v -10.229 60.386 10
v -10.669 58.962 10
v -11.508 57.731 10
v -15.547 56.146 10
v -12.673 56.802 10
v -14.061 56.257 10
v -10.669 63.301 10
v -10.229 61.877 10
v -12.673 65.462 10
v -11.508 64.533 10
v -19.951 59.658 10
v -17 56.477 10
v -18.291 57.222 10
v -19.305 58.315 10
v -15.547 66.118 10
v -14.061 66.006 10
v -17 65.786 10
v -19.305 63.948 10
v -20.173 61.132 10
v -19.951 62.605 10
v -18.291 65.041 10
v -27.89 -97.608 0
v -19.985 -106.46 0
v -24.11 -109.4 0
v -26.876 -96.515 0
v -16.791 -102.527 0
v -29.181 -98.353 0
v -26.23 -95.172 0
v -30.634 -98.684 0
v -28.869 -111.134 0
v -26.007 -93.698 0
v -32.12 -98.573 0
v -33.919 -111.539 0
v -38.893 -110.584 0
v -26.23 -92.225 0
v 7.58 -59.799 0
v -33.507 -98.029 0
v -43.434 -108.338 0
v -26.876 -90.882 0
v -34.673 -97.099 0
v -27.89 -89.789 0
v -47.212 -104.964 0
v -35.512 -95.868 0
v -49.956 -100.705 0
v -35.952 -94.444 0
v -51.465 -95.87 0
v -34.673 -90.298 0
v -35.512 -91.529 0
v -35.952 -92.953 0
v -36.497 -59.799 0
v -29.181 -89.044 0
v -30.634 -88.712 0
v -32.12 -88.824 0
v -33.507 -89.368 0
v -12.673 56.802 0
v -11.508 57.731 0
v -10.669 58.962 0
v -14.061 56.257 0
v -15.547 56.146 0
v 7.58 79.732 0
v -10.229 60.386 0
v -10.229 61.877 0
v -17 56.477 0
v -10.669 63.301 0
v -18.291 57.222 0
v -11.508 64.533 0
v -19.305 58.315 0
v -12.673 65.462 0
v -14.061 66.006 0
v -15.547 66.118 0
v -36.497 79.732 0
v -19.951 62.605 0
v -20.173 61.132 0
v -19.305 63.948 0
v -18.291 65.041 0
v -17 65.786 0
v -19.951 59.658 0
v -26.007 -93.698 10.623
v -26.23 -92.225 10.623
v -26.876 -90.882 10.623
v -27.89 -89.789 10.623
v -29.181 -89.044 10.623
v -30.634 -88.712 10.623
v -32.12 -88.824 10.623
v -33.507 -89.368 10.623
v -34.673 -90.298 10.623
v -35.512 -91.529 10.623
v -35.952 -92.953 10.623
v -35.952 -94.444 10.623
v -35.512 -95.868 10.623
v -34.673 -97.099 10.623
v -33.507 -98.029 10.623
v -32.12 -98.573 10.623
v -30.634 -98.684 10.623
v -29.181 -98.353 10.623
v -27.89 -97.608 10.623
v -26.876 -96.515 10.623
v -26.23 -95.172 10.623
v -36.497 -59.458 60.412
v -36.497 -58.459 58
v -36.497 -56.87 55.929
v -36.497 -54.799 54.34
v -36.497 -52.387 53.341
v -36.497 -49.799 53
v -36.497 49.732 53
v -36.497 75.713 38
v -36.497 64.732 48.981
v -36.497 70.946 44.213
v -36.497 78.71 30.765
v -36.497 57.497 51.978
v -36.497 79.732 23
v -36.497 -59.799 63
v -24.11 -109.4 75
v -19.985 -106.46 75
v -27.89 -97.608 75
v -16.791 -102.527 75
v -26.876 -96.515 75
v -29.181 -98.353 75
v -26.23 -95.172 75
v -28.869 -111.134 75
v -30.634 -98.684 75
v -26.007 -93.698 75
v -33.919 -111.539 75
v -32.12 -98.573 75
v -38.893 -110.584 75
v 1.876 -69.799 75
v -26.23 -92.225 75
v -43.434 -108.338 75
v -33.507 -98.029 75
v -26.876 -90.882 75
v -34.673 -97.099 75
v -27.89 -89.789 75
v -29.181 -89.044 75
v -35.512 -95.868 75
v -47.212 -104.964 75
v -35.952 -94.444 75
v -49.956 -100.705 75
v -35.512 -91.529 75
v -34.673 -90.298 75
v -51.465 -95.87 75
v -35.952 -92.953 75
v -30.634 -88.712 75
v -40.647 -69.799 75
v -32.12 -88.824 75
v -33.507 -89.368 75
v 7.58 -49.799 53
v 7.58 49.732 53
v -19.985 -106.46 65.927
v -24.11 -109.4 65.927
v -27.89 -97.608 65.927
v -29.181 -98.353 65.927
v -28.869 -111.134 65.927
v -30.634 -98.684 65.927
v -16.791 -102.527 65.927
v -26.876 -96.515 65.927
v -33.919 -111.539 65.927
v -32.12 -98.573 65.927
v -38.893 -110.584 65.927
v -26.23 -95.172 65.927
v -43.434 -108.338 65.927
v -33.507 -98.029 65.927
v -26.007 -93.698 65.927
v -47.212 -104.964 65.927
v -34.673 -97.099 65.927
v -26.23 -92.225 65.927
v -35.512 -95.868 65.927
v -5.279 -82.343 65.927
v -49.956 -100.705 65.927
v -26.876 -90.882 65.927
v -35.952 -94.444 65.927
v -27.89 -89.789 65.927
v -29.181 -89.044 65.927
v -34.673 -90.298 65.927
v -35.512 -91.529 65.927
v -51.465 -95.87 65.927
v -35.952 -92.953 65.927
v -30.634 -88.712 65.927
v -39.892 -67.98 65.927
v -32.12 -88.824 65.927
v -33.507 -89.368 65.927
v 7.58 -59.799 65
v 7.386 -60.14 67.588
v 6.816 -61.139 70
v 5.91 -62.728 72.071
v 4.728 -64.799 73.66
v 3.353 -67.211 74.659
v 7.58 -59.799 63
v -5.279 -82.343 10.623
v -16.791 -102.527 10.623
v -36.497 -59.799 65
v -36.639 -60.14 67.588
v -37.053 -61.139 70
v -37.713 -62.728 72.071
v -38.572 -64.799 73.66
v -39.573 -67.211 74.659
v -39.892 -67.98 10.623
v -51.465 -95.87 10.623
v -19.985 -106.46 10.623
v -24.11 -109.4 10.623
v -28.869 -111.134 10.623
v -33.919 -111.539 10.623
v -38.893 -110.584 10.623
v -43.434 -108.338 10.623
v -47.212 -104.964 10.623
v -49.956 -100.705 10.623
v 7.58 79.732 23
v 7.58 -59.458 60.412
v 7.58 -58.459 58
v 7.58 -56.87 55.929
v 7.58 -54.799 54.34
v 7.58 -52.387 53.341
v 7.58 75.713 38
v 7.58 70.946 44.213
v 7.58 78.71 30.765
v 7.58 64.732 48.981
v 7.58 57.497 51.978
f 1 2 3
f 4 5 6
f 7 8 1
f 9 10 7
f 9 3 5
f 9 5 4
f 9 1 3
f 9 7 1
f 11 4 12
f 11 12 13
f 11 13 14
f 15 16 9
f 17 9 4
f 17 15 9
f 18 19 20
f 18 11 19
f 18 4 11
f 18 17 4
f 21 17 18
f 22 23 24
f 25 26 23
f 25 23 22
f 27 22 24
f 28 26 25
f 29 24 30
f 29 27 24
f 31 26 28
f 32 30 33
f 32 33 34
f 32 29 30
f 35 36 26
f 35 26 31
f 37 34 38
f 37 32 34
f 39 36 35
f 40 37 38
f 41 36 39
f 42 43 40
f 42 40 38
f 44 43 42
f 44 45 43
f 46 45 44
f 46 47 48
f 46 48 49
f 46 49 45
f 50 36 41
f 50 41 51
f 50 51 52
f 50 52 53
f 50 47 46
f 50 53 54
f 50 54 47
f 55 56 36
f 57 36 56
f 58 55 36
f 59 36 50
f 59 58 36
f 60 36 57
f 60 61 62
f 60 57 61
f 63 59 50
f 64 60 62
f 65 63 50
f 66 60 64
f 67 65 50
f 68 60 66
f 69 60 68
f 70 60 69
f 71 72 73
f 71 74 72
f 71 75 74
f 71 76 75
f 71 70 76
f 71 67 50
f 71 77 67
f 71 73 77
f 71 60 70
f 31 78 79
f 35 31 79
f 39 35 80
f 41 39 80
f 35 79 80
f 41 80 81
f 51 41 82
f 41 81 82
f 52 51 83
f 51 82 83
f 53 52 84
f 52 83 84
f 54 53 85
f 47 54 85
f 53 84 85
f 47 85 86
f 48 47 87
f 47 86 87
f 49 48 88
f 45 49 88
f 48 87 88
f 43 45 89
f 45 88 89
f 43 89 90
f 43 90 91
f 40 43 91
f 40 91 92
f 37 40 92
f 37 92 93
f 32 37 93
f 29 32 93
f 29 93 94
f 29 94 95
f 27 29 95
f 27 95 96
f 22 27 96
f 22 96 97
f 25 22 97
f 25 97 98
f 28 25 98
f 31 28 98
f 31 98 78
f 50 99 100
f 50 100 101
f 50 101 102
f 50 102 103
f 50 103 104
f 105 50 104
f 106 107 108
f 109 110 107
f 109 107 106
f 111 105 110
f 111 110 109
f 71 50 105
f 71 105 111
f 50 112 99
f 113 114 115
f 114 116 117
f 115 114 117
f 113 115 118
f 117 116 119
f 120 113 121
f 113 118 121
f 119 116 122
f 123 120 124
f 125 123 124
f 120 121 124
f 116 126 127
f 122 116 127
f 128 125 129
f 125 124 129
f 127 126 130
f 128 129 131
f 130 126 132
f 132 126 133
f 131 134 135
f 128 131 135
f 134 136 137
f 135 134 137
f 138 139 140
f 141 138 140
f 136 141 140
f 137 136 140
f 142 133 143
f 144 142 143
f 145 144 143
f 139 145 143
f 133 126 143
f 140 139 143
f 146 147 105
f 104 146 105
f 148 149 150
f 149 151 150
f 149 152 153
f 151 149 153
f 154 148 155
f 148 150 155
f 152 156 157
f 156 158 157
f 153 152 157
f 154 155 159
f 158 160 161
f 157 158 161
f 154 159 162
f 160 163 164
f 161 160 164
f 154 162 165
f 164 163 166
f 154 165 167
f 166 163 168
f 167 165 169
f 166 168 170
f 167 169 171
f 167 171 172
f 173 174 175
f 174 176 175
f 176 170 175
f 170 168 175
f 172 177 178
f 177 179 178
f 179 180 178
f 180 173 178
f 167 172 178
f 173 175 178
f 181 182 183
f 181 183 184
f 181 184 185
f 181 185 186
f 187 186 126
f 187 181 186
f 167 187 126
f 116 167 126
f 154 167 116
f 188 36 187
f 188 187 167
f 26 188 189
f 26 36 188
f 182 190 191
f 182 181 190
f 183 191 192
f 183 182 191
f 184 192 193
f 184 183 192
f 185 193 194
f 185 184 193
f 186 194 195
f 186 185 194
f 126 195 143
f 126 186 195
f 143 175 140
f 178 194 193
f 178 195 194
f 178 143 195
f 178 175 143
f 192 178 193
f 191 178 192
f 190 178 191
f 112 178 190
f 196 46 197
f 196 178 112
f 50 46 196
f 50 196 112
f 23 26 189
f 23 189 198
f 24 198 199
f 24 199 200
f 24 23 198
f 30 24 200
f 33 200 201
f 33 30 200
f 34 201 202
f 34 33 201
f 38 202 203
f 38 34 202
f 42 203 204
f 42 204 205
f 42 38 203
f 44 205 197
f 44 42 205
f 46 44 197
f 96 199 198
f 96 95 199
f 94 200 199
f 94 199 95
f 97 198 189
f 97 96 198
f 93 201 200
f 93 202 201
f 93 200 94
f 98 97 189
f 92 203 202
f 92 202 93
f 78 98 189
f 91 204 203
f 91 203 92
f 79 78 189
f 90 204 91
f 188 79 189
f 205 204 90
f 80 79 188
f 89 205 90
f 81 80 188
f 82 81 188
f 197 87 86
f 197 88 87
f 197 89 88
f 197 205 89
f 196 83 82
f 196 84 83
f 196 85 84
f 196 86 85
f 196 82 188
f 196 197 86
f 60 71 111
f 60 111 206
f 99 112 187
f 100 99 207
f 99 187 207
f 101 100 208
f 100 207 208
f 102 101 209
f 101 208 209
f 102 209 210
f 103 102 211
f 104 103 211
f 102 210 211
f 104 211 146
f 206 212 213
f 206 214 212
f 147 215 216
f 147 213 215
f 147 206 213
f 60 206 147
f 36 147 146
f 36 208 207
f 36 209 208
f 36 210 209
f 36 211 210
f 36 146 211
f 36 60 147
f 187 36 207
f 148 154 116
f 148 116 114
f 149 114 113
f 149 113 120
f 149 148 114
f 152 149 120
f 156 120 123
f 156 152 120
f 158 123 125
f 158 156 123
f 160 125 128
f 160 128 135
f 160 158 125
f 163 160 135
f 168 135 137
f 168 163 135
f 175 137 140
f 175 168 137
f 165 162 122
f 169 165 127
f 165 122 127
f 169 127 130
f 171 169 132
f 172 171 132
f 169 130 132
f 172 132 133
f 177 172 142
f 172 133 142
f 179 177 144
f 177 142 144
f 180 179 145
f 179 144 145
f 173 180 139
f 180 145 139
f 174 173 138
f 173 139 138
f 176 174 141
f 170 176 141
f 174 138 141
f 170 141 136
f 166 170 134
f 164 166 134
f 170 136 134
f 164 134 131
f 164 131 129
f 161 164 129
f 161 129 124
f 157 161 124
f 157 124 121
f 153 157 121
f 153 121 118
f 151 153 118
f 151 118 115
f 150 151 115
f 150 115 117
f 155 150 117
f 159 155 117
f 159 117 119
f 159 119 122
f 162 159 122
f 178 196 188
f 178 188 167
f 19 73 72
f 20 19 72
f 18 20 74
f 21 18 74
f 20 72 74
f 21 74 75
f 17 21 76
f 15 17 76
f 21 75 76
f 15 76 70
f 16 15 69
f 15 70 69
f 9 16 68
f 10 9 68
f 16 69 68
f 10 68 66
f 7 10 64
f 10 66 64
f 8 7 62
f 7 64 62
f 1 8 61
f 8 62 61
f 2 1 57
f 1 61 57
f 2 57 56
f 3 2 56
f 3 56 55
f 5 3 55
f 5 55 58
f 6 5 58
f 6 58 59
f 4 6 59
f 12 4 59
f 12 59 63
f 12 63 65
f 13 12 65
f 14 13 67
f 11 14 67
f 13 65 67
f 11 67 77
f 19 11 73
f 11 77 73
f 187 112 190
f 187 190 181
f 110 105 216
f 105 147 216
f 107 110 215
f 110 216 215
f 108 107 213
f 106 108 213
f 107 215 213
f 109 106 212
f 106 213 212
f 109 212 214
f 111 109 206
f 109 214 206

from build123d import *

# Parameters (mm, degrees)
EXTRUDE_1_DEPTH     = 53
EXTRUDE_2_DEPTH     = 22
FILLET_2_R          = 10
FILLET_3_R          = 10
SKETCH_3_W          = 55.304366744
SKETCH_3_H          = 61.895042574
CUT_EXTRUDE_1_DEPTH = 56
SKETCH_4_R          = 5
CUT_EXTRUDE_2_DEPTH = 75
SKETCH_5_R          = 5
CUT_EXTRUDE_3_DEPTH = 10
FILLET_4_R          = 30


with BuildPart() as part:
    # Эскиз1 → Бобышка-Вытянуть1 (new body)
    with BuildSketch(Plane.XY):
        with BuildLine():
            Line((7.580184654, -59.799234496), (-16.79145183, -102.52734615))
            ThreePointArc((-16.79145183, -102.52734615), (-36.438294134, -111.229048288), (-51.465460174, -95.869936548))
            Line((-51.465460174, -95.869936548), (-36.497185373, -59.799234496))
            Line((-36.497185373, -59.799234496), (-36.497185373, 79.732312661))
            Line((-36.497185373, 79.732312661), (7.580184654, 79.732312661))
            Line((7.580184654, 79.732312661), (7.580184654, -59.799234496))
        make_face()
    extrude(amount=EXTRUDE_1_DEPTH)

    # Эскиз2 → Бобышка-Вытянуть2 (add)
    with BuildSketch(Plane.XY.offset(53)):
        with BuildLine():
            Line((-36.497185373, -59.799234496), (7.580184654, -59.799234496))
            Line((7.580184654, -59.799234496), (-16.79145183, -102.52734615))
            ThreePointArc((-16.79145183, -102.52734615), (-36.438294134, -111.229048288), (-51.465460174, -95.869936548))
            Line((-51.465460174, -95.869936548), (-36.497185373, -59.799234496))
        make_face()
    extrude(amount=EXTRUDE_2_DEPTH)

    # Скругление2
    fillet_2_edges = [part.edges().sort_by_distance(p)[0] for p in [
        (-14.458500359, -59.799234496, 53),
    ]]
    fillet(fillet_2_edges, radius=FILLET_2_R)

    # Скругление3
    fillet_3_edges = [part.edges().sort_by_distance(p)[0] for p in [
        (-14.458500359, -59.799234496, 75),
    ]]
    fillet(fillet_3_edges, radius=FILLET_3_R)

    # Эскиз3 → Вырез-Вытянуть1 (cut)
    with BuildSketch(Plane(origin=(-9.966103605, 4.135638315, 0), x_dir=(0, 0, 1), z_dir=(-0.923632182, 0.383280045, 0))):
        with Locations((38.275019494, -109.025889751)):
            Rectangle(SKETCH_3_W, SKETCH_3_H)
    extrude(amount=-CUT_EXTRUDE_1_DEPTH, mode=Mode.SUBTRACT)

    # Эскиз4 → Вырез-Вытянуть2 (cut)
    with BuildSketch(Plane.XY.offset(75)):
        with Locations((-31.007416938, -93.698436978)):
            Circle(SKETCH_4_R)
    extrude(amount=-CUT_EXTRUDE_2_DEPTH, mode=Mode.SUBTRACT)

    # Эскиз5 → Вырез-Вытянуть3 (cut)
    with BuildSketch(Plane(origin=(0, 0, 0), x_dir=(-1, 0, 0), z_dir=(0, 0, -1))):
        with Locations((15.173432646, 61.131642173)):
            Circle(SKETCH_5_R)
    extrude(amount=-CUT_EXTRUDE_3_DEPTH, mode=Mode.SUBTRACT)

    # Скругление4
    fillet_4_edges = [part.edges().sort_by_distance(p)[0] for p in [
        (-14.458500359, 79.732312661, 53),
    ]]
    fillet(fillet_4_edges, radius=FILLET_4_R)


solid = part.part
